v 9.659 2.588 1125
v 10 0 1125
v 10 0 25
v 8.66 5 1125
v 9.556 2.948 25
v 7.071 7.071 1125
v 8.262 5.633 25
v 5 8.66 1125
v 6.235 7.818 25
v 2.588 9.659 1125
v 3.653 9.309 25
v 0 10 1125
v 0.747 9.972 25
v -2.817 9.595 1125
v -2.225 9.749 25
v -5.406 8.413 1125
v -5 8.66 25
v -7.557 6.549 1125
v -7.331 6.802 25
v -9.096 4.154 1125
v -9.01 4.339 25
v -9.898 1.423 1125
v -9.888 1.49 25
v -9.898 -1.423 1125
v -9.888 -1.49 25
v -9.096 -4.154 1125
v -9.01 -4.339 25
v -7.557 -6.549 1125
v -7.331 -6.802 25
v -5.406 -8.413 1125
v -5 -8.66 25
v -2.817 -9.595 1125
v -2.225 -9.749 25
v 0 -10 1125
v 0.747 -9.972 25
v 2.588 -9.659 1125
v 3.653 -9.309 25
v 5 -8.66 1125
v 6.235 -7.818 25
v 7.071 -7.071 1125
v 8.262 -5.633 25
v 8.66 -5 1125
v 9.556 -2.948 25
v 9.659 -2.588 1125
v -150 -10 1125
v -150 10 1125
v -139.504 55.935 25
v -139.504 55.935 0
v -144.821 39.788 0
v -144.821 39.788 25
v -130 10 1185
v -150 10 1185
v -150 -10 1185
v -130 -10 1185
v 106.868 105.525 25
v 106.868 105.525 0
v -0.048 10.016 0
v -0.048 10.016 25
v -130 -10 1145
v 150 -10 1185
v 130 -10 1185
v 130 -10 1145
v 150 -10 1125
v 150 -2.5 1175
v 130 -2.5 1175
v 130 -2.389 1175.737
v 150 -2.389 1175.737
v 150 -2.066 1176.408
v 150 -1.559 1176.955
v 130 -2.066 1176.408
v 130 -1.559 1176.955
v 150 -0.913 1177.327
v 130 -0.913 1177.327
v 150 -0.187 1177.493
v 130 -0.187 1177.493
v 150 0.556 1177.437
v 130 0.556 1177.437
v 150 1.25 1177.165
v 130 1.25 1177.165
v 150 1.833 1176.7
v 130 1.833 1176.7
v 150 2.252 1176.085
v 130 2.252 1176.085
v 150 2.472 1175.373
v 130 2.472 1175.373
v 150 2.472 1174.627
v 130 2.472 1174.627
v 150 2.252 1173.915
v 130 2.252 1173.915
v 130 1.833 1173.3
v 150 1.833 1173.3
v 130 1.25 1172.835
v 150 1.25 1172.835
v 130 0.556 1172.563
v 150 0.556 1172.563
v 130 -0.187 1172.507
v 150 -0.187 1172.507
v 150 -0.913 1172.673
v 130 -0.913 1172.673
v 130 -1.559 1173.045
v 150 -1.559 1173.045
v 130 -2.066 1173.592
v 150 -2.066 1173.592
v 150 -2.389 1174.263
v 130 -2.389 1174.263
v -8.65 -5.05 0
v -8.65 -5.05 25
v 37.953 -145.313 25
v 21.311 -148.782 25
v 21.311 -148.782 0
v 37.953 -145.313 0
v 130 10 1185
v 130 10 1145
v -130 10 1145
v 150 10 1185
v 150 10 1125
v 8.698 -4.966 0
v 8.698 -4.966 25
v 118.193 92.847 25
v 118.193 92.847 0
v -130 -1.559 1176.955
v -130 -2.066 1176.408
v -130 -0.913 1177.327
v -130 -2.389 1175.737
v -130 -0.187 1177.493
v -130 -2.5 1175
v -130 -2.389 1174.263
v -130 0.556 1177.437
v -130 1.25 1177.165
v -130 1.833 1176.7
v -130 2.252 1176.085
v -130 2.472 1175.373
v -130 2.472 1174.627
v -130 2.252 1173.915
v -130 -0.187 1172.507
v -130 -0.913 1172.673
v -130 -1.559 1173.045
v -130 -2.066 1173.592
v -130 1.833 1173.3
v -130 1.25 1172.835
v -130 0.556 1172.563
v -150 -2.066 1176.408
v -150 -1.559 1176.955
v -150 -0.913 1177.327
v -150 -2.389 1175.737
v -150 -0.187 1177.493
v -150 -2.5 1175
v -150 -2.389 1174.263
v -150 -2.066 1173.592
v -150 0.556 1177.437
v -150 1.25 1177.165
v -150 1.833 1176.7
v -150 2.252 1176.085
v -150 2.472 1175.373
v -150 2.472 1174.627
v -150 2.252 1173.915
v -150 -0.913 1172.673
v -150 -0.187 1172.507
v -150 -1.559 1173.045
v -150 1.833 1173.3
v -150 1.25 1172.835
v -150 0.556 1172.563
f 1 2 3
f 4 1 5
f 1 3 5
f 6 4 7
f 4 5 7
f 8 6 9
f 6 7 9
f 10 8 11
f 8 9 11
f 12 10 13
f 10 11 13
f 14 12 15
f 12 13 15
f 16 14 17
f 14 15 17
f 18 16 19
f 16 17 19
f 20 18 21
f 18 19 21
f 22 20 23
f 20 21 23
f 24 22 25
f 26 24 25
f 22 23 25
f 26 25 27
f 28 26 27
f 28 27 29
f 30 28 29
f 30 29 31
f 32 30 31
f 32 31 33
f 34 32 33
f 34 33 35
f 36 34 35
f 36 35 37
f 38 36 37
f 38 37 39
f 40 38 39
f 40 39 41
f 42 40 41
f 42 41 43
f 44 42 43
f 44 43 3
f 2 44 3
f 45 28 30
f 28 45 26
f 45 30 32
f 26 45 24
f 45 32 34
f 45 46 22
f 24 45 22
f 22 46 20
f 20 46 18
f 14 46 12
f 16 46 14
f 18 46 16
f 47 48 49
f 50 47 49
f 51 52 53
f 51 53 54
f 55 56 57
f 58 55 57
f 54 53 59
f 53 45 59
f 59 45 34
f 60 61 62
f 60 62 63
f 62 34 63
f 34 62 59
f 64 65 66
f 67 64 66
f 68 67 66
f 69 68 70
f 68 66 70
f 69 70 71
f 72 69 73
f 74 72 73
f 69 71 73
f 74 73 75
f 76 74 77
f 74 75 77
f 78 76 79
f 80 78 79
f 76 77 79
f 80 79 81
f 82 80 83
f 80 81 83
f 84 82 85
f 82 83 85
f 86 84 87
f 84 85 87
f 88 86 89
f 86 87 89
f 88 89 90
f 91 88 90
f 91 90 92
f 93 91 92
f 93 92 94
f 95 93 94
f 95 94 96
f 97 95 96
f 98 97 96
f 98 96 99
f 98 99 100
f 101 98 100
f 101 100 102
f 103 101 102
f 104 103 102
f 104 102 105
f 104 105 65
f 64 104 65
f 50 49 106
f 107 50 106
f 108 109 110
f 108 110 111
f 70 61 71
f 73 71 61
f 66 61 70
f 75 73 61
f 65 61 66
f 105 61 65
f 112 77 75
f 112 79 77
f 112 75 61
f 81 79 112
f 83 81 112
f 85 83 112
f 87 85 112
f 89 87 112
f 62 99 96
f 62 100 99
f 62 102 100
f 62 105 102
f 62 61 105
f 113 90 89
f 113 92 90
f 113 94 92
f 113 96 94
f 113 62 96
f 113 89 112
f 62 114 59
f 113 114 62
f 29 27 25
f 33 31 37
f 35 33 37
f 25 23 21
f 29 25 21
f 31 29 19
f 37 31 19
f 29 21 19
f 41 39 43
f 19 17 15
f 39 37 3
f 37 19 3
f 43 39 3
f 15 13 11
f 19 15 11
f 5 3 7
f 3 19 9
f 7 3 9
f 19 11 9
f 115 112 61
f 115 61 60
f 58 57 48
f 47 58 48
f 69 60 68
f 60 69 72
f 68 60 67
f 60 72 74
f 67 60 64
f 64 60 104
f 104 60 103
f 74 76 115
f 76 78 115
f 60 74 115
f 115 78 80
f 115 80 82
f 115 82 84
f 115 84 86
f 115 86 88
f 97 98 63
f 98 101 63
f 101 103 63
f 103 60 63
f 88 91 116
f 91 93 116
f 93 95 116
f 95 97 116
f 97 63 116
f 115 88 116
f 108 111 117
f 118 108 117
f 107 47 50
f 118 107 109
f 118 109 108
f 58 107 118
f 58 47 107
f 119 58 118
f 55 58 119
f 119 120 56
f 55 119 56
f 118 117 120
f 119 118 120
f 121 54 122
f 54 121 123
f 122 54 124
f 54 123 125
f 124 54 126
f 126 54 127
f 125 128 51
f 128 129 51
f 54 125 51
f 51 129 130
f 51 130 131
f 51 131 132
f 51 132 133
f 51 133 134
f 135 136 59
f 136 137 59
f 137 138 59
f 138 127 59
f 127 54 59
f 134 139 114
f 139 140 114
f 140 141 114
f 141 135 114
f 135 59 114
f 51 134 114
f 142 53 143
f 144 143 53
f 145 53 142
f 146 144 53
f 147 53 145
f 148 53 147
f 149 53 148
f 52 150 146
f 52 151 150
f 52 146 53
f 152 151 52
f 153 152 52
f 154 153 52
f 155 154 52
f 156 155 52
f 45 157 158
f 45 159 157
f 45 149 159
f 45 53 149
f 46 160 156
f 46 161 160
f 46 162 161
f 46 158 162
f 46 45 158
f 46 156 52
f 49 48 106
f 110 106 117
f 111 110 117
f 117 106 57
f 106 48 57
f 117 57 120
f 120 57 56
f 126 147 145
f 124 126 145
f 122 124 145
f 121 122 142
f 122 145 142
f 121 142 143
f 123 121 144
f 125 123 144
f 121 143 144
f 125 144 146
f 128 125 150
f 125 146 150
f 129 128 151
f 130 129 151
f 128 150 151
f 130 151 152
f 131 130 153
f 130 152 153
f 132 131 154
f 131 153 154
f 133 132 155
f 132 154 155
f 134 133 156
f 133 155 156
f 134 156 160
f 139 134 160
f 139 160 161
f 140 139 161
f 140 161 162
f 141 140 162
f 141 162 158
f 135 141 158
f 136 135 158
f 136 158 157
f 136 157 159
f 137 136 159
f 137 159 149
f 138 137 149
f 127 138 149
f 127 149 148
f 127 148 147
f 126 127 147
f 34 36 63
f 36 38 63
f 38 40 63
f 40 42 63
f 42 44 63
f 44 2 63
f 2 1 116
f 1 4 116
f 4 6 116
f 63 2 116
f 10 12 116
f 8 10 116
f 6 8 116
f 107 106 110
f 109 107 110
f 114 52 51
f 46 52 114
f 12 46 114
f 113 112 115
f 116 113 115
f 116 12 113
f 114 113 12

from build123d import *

# Parameters (mm, degrees)
F1_DEPTH = 25
F2_R     = 10
F3_DEPTH = 1100
F4_W     = 300
F4_H     = 20
F5_DEPTH = 20
F6_W     = 20
F6_H     = 20
F7_DEPTH = 40
F8_R     = 2.5
F9_DEPTH = 500


with BuildPart() as f1:
    # F0 (on Top) → F1 (new body)
    with BuildSketch(Plane.XY):
        Polygon((106.8678610383, 105.5250451441), (-0.0482127534, 10.0158751169), (-139.5044833357, 55.9349410156), (-144.8213003494, 39.7877599353), (-8.6498959157, -5.0496910277), (21.3111617891, -148.7818970183), (37.9534393111, -145.3128050793), (8.6981086691, -4.9661840892), (118.1933215466, 92.8469560027), align=None)
        with BuildLine():
            Line((-8.6269494076, -5.0572466738), (-8.6498959157, -5.0496910277))
            Line((-8.6498959157, -5.0496910277), (-8.6602540378, -5))
            ThreePointArc((-8.6602540378, -5), (-8.6436491157, -5.0286509089), (-8.6269494076, -5.0572466738))
        make_face(mode=Mode.SUBTRACT)
        with BuildLine():
            Line((-0.0482127534, 10.0158751169), (0, 10))
            ThreePointArc((0, 10), (-0.033114876, 9.9999451701), (-0.0662293889, 9.999780681))
            Line((-0.0662293889, 9.999780681), (-0.0482127534, 10.0158751169))
        make_face(mode=Mode.SUBTRACT)
        with BuildLine():
            Line((8.6931787965, -4.9425340072), (8.6981086691, -4.9661840892))
            Line((8.6981086691, -4.9661840892), (8.6602540378, -5))
            ThreePointArc((8.6602540378, -5), (8.6767639918, -4.9712942612), (8.6931787965, -4.9425340072))
        make_face(mode=Mode.SUBTRACT)
        with BuildLine():
            Line((-8.6602540378, -5), (-8.6498959157, -5.0496910277))
            Line((-8.6498959157, -5.0496910277), (-8.6269494076, -5.0572466738))
            ThreePointArc((-8.6269494076, -5.0572466738), (-8.6436491157, -5.0286509089), (-8.6602540378, -5))
        make_face()
        with BuildLine():
            Line((8.6602540378, -5), (8.6981086691, -4.9661840892))
            Line((8.6981086691, -4.9661840892), (8.6931787965, -4.9425340072))
            ThreePointArc((8.6931787965, -4.9425340072), (8.6767639918, -4.9712942612), (8.6602540378, -5))
        make_face()
        with BuildLine():
            ThreePointArc((-0.0662293889, 9.999780681), (-0.033114876, 9.9999451701), (0, 10))
            Line((0, 10), (-0.0482127534, 10.0158751169))
            Line((-0.0482127534, 10.0158751169), (-0.0662293889, 9.999780681))
        make_face()
    extrude(amount=F1_DEPTH)


with BuildPart() as f3:
    # F2 (on face) → F3 (new body)
    with BuildSketch(Plane.XY.offset(25)):
        Circle(F2_R)
    extrude(amount=F3_DEPTH)

    # F4 (on face) → F5 (join)
    with BuildSketch(Plane.XY.offset(1125)):
        Rectangle(F4_W, F4_H)
    extrude(amount=F5_DEPTH)

    # F6 (on face) → F7 (join)
    with BuildSketch(Plane.XY.offset(1145)):
        with Locations((-140, 0)):
            Rectangle(F6_W, F6_H)
        with Locations((140, 0)):
            Rectangle(F6_W, F6_H)
    extrude(amount=F7_DEPTH)

    # F8 (on face) → F9 (cut)
    with BuildSketch(Plane(origin=(-150, 0, 0), x_dir=(0, -1, 0), z_dir=(-1, 0, 0))):
        with Locations((0, 1175)):
            Circle(F8_R)
    extrude(amount=-F9_DEPTH, mode=Mode.SUBTRACT)


solid = Compound([f1.part, f3.part])
